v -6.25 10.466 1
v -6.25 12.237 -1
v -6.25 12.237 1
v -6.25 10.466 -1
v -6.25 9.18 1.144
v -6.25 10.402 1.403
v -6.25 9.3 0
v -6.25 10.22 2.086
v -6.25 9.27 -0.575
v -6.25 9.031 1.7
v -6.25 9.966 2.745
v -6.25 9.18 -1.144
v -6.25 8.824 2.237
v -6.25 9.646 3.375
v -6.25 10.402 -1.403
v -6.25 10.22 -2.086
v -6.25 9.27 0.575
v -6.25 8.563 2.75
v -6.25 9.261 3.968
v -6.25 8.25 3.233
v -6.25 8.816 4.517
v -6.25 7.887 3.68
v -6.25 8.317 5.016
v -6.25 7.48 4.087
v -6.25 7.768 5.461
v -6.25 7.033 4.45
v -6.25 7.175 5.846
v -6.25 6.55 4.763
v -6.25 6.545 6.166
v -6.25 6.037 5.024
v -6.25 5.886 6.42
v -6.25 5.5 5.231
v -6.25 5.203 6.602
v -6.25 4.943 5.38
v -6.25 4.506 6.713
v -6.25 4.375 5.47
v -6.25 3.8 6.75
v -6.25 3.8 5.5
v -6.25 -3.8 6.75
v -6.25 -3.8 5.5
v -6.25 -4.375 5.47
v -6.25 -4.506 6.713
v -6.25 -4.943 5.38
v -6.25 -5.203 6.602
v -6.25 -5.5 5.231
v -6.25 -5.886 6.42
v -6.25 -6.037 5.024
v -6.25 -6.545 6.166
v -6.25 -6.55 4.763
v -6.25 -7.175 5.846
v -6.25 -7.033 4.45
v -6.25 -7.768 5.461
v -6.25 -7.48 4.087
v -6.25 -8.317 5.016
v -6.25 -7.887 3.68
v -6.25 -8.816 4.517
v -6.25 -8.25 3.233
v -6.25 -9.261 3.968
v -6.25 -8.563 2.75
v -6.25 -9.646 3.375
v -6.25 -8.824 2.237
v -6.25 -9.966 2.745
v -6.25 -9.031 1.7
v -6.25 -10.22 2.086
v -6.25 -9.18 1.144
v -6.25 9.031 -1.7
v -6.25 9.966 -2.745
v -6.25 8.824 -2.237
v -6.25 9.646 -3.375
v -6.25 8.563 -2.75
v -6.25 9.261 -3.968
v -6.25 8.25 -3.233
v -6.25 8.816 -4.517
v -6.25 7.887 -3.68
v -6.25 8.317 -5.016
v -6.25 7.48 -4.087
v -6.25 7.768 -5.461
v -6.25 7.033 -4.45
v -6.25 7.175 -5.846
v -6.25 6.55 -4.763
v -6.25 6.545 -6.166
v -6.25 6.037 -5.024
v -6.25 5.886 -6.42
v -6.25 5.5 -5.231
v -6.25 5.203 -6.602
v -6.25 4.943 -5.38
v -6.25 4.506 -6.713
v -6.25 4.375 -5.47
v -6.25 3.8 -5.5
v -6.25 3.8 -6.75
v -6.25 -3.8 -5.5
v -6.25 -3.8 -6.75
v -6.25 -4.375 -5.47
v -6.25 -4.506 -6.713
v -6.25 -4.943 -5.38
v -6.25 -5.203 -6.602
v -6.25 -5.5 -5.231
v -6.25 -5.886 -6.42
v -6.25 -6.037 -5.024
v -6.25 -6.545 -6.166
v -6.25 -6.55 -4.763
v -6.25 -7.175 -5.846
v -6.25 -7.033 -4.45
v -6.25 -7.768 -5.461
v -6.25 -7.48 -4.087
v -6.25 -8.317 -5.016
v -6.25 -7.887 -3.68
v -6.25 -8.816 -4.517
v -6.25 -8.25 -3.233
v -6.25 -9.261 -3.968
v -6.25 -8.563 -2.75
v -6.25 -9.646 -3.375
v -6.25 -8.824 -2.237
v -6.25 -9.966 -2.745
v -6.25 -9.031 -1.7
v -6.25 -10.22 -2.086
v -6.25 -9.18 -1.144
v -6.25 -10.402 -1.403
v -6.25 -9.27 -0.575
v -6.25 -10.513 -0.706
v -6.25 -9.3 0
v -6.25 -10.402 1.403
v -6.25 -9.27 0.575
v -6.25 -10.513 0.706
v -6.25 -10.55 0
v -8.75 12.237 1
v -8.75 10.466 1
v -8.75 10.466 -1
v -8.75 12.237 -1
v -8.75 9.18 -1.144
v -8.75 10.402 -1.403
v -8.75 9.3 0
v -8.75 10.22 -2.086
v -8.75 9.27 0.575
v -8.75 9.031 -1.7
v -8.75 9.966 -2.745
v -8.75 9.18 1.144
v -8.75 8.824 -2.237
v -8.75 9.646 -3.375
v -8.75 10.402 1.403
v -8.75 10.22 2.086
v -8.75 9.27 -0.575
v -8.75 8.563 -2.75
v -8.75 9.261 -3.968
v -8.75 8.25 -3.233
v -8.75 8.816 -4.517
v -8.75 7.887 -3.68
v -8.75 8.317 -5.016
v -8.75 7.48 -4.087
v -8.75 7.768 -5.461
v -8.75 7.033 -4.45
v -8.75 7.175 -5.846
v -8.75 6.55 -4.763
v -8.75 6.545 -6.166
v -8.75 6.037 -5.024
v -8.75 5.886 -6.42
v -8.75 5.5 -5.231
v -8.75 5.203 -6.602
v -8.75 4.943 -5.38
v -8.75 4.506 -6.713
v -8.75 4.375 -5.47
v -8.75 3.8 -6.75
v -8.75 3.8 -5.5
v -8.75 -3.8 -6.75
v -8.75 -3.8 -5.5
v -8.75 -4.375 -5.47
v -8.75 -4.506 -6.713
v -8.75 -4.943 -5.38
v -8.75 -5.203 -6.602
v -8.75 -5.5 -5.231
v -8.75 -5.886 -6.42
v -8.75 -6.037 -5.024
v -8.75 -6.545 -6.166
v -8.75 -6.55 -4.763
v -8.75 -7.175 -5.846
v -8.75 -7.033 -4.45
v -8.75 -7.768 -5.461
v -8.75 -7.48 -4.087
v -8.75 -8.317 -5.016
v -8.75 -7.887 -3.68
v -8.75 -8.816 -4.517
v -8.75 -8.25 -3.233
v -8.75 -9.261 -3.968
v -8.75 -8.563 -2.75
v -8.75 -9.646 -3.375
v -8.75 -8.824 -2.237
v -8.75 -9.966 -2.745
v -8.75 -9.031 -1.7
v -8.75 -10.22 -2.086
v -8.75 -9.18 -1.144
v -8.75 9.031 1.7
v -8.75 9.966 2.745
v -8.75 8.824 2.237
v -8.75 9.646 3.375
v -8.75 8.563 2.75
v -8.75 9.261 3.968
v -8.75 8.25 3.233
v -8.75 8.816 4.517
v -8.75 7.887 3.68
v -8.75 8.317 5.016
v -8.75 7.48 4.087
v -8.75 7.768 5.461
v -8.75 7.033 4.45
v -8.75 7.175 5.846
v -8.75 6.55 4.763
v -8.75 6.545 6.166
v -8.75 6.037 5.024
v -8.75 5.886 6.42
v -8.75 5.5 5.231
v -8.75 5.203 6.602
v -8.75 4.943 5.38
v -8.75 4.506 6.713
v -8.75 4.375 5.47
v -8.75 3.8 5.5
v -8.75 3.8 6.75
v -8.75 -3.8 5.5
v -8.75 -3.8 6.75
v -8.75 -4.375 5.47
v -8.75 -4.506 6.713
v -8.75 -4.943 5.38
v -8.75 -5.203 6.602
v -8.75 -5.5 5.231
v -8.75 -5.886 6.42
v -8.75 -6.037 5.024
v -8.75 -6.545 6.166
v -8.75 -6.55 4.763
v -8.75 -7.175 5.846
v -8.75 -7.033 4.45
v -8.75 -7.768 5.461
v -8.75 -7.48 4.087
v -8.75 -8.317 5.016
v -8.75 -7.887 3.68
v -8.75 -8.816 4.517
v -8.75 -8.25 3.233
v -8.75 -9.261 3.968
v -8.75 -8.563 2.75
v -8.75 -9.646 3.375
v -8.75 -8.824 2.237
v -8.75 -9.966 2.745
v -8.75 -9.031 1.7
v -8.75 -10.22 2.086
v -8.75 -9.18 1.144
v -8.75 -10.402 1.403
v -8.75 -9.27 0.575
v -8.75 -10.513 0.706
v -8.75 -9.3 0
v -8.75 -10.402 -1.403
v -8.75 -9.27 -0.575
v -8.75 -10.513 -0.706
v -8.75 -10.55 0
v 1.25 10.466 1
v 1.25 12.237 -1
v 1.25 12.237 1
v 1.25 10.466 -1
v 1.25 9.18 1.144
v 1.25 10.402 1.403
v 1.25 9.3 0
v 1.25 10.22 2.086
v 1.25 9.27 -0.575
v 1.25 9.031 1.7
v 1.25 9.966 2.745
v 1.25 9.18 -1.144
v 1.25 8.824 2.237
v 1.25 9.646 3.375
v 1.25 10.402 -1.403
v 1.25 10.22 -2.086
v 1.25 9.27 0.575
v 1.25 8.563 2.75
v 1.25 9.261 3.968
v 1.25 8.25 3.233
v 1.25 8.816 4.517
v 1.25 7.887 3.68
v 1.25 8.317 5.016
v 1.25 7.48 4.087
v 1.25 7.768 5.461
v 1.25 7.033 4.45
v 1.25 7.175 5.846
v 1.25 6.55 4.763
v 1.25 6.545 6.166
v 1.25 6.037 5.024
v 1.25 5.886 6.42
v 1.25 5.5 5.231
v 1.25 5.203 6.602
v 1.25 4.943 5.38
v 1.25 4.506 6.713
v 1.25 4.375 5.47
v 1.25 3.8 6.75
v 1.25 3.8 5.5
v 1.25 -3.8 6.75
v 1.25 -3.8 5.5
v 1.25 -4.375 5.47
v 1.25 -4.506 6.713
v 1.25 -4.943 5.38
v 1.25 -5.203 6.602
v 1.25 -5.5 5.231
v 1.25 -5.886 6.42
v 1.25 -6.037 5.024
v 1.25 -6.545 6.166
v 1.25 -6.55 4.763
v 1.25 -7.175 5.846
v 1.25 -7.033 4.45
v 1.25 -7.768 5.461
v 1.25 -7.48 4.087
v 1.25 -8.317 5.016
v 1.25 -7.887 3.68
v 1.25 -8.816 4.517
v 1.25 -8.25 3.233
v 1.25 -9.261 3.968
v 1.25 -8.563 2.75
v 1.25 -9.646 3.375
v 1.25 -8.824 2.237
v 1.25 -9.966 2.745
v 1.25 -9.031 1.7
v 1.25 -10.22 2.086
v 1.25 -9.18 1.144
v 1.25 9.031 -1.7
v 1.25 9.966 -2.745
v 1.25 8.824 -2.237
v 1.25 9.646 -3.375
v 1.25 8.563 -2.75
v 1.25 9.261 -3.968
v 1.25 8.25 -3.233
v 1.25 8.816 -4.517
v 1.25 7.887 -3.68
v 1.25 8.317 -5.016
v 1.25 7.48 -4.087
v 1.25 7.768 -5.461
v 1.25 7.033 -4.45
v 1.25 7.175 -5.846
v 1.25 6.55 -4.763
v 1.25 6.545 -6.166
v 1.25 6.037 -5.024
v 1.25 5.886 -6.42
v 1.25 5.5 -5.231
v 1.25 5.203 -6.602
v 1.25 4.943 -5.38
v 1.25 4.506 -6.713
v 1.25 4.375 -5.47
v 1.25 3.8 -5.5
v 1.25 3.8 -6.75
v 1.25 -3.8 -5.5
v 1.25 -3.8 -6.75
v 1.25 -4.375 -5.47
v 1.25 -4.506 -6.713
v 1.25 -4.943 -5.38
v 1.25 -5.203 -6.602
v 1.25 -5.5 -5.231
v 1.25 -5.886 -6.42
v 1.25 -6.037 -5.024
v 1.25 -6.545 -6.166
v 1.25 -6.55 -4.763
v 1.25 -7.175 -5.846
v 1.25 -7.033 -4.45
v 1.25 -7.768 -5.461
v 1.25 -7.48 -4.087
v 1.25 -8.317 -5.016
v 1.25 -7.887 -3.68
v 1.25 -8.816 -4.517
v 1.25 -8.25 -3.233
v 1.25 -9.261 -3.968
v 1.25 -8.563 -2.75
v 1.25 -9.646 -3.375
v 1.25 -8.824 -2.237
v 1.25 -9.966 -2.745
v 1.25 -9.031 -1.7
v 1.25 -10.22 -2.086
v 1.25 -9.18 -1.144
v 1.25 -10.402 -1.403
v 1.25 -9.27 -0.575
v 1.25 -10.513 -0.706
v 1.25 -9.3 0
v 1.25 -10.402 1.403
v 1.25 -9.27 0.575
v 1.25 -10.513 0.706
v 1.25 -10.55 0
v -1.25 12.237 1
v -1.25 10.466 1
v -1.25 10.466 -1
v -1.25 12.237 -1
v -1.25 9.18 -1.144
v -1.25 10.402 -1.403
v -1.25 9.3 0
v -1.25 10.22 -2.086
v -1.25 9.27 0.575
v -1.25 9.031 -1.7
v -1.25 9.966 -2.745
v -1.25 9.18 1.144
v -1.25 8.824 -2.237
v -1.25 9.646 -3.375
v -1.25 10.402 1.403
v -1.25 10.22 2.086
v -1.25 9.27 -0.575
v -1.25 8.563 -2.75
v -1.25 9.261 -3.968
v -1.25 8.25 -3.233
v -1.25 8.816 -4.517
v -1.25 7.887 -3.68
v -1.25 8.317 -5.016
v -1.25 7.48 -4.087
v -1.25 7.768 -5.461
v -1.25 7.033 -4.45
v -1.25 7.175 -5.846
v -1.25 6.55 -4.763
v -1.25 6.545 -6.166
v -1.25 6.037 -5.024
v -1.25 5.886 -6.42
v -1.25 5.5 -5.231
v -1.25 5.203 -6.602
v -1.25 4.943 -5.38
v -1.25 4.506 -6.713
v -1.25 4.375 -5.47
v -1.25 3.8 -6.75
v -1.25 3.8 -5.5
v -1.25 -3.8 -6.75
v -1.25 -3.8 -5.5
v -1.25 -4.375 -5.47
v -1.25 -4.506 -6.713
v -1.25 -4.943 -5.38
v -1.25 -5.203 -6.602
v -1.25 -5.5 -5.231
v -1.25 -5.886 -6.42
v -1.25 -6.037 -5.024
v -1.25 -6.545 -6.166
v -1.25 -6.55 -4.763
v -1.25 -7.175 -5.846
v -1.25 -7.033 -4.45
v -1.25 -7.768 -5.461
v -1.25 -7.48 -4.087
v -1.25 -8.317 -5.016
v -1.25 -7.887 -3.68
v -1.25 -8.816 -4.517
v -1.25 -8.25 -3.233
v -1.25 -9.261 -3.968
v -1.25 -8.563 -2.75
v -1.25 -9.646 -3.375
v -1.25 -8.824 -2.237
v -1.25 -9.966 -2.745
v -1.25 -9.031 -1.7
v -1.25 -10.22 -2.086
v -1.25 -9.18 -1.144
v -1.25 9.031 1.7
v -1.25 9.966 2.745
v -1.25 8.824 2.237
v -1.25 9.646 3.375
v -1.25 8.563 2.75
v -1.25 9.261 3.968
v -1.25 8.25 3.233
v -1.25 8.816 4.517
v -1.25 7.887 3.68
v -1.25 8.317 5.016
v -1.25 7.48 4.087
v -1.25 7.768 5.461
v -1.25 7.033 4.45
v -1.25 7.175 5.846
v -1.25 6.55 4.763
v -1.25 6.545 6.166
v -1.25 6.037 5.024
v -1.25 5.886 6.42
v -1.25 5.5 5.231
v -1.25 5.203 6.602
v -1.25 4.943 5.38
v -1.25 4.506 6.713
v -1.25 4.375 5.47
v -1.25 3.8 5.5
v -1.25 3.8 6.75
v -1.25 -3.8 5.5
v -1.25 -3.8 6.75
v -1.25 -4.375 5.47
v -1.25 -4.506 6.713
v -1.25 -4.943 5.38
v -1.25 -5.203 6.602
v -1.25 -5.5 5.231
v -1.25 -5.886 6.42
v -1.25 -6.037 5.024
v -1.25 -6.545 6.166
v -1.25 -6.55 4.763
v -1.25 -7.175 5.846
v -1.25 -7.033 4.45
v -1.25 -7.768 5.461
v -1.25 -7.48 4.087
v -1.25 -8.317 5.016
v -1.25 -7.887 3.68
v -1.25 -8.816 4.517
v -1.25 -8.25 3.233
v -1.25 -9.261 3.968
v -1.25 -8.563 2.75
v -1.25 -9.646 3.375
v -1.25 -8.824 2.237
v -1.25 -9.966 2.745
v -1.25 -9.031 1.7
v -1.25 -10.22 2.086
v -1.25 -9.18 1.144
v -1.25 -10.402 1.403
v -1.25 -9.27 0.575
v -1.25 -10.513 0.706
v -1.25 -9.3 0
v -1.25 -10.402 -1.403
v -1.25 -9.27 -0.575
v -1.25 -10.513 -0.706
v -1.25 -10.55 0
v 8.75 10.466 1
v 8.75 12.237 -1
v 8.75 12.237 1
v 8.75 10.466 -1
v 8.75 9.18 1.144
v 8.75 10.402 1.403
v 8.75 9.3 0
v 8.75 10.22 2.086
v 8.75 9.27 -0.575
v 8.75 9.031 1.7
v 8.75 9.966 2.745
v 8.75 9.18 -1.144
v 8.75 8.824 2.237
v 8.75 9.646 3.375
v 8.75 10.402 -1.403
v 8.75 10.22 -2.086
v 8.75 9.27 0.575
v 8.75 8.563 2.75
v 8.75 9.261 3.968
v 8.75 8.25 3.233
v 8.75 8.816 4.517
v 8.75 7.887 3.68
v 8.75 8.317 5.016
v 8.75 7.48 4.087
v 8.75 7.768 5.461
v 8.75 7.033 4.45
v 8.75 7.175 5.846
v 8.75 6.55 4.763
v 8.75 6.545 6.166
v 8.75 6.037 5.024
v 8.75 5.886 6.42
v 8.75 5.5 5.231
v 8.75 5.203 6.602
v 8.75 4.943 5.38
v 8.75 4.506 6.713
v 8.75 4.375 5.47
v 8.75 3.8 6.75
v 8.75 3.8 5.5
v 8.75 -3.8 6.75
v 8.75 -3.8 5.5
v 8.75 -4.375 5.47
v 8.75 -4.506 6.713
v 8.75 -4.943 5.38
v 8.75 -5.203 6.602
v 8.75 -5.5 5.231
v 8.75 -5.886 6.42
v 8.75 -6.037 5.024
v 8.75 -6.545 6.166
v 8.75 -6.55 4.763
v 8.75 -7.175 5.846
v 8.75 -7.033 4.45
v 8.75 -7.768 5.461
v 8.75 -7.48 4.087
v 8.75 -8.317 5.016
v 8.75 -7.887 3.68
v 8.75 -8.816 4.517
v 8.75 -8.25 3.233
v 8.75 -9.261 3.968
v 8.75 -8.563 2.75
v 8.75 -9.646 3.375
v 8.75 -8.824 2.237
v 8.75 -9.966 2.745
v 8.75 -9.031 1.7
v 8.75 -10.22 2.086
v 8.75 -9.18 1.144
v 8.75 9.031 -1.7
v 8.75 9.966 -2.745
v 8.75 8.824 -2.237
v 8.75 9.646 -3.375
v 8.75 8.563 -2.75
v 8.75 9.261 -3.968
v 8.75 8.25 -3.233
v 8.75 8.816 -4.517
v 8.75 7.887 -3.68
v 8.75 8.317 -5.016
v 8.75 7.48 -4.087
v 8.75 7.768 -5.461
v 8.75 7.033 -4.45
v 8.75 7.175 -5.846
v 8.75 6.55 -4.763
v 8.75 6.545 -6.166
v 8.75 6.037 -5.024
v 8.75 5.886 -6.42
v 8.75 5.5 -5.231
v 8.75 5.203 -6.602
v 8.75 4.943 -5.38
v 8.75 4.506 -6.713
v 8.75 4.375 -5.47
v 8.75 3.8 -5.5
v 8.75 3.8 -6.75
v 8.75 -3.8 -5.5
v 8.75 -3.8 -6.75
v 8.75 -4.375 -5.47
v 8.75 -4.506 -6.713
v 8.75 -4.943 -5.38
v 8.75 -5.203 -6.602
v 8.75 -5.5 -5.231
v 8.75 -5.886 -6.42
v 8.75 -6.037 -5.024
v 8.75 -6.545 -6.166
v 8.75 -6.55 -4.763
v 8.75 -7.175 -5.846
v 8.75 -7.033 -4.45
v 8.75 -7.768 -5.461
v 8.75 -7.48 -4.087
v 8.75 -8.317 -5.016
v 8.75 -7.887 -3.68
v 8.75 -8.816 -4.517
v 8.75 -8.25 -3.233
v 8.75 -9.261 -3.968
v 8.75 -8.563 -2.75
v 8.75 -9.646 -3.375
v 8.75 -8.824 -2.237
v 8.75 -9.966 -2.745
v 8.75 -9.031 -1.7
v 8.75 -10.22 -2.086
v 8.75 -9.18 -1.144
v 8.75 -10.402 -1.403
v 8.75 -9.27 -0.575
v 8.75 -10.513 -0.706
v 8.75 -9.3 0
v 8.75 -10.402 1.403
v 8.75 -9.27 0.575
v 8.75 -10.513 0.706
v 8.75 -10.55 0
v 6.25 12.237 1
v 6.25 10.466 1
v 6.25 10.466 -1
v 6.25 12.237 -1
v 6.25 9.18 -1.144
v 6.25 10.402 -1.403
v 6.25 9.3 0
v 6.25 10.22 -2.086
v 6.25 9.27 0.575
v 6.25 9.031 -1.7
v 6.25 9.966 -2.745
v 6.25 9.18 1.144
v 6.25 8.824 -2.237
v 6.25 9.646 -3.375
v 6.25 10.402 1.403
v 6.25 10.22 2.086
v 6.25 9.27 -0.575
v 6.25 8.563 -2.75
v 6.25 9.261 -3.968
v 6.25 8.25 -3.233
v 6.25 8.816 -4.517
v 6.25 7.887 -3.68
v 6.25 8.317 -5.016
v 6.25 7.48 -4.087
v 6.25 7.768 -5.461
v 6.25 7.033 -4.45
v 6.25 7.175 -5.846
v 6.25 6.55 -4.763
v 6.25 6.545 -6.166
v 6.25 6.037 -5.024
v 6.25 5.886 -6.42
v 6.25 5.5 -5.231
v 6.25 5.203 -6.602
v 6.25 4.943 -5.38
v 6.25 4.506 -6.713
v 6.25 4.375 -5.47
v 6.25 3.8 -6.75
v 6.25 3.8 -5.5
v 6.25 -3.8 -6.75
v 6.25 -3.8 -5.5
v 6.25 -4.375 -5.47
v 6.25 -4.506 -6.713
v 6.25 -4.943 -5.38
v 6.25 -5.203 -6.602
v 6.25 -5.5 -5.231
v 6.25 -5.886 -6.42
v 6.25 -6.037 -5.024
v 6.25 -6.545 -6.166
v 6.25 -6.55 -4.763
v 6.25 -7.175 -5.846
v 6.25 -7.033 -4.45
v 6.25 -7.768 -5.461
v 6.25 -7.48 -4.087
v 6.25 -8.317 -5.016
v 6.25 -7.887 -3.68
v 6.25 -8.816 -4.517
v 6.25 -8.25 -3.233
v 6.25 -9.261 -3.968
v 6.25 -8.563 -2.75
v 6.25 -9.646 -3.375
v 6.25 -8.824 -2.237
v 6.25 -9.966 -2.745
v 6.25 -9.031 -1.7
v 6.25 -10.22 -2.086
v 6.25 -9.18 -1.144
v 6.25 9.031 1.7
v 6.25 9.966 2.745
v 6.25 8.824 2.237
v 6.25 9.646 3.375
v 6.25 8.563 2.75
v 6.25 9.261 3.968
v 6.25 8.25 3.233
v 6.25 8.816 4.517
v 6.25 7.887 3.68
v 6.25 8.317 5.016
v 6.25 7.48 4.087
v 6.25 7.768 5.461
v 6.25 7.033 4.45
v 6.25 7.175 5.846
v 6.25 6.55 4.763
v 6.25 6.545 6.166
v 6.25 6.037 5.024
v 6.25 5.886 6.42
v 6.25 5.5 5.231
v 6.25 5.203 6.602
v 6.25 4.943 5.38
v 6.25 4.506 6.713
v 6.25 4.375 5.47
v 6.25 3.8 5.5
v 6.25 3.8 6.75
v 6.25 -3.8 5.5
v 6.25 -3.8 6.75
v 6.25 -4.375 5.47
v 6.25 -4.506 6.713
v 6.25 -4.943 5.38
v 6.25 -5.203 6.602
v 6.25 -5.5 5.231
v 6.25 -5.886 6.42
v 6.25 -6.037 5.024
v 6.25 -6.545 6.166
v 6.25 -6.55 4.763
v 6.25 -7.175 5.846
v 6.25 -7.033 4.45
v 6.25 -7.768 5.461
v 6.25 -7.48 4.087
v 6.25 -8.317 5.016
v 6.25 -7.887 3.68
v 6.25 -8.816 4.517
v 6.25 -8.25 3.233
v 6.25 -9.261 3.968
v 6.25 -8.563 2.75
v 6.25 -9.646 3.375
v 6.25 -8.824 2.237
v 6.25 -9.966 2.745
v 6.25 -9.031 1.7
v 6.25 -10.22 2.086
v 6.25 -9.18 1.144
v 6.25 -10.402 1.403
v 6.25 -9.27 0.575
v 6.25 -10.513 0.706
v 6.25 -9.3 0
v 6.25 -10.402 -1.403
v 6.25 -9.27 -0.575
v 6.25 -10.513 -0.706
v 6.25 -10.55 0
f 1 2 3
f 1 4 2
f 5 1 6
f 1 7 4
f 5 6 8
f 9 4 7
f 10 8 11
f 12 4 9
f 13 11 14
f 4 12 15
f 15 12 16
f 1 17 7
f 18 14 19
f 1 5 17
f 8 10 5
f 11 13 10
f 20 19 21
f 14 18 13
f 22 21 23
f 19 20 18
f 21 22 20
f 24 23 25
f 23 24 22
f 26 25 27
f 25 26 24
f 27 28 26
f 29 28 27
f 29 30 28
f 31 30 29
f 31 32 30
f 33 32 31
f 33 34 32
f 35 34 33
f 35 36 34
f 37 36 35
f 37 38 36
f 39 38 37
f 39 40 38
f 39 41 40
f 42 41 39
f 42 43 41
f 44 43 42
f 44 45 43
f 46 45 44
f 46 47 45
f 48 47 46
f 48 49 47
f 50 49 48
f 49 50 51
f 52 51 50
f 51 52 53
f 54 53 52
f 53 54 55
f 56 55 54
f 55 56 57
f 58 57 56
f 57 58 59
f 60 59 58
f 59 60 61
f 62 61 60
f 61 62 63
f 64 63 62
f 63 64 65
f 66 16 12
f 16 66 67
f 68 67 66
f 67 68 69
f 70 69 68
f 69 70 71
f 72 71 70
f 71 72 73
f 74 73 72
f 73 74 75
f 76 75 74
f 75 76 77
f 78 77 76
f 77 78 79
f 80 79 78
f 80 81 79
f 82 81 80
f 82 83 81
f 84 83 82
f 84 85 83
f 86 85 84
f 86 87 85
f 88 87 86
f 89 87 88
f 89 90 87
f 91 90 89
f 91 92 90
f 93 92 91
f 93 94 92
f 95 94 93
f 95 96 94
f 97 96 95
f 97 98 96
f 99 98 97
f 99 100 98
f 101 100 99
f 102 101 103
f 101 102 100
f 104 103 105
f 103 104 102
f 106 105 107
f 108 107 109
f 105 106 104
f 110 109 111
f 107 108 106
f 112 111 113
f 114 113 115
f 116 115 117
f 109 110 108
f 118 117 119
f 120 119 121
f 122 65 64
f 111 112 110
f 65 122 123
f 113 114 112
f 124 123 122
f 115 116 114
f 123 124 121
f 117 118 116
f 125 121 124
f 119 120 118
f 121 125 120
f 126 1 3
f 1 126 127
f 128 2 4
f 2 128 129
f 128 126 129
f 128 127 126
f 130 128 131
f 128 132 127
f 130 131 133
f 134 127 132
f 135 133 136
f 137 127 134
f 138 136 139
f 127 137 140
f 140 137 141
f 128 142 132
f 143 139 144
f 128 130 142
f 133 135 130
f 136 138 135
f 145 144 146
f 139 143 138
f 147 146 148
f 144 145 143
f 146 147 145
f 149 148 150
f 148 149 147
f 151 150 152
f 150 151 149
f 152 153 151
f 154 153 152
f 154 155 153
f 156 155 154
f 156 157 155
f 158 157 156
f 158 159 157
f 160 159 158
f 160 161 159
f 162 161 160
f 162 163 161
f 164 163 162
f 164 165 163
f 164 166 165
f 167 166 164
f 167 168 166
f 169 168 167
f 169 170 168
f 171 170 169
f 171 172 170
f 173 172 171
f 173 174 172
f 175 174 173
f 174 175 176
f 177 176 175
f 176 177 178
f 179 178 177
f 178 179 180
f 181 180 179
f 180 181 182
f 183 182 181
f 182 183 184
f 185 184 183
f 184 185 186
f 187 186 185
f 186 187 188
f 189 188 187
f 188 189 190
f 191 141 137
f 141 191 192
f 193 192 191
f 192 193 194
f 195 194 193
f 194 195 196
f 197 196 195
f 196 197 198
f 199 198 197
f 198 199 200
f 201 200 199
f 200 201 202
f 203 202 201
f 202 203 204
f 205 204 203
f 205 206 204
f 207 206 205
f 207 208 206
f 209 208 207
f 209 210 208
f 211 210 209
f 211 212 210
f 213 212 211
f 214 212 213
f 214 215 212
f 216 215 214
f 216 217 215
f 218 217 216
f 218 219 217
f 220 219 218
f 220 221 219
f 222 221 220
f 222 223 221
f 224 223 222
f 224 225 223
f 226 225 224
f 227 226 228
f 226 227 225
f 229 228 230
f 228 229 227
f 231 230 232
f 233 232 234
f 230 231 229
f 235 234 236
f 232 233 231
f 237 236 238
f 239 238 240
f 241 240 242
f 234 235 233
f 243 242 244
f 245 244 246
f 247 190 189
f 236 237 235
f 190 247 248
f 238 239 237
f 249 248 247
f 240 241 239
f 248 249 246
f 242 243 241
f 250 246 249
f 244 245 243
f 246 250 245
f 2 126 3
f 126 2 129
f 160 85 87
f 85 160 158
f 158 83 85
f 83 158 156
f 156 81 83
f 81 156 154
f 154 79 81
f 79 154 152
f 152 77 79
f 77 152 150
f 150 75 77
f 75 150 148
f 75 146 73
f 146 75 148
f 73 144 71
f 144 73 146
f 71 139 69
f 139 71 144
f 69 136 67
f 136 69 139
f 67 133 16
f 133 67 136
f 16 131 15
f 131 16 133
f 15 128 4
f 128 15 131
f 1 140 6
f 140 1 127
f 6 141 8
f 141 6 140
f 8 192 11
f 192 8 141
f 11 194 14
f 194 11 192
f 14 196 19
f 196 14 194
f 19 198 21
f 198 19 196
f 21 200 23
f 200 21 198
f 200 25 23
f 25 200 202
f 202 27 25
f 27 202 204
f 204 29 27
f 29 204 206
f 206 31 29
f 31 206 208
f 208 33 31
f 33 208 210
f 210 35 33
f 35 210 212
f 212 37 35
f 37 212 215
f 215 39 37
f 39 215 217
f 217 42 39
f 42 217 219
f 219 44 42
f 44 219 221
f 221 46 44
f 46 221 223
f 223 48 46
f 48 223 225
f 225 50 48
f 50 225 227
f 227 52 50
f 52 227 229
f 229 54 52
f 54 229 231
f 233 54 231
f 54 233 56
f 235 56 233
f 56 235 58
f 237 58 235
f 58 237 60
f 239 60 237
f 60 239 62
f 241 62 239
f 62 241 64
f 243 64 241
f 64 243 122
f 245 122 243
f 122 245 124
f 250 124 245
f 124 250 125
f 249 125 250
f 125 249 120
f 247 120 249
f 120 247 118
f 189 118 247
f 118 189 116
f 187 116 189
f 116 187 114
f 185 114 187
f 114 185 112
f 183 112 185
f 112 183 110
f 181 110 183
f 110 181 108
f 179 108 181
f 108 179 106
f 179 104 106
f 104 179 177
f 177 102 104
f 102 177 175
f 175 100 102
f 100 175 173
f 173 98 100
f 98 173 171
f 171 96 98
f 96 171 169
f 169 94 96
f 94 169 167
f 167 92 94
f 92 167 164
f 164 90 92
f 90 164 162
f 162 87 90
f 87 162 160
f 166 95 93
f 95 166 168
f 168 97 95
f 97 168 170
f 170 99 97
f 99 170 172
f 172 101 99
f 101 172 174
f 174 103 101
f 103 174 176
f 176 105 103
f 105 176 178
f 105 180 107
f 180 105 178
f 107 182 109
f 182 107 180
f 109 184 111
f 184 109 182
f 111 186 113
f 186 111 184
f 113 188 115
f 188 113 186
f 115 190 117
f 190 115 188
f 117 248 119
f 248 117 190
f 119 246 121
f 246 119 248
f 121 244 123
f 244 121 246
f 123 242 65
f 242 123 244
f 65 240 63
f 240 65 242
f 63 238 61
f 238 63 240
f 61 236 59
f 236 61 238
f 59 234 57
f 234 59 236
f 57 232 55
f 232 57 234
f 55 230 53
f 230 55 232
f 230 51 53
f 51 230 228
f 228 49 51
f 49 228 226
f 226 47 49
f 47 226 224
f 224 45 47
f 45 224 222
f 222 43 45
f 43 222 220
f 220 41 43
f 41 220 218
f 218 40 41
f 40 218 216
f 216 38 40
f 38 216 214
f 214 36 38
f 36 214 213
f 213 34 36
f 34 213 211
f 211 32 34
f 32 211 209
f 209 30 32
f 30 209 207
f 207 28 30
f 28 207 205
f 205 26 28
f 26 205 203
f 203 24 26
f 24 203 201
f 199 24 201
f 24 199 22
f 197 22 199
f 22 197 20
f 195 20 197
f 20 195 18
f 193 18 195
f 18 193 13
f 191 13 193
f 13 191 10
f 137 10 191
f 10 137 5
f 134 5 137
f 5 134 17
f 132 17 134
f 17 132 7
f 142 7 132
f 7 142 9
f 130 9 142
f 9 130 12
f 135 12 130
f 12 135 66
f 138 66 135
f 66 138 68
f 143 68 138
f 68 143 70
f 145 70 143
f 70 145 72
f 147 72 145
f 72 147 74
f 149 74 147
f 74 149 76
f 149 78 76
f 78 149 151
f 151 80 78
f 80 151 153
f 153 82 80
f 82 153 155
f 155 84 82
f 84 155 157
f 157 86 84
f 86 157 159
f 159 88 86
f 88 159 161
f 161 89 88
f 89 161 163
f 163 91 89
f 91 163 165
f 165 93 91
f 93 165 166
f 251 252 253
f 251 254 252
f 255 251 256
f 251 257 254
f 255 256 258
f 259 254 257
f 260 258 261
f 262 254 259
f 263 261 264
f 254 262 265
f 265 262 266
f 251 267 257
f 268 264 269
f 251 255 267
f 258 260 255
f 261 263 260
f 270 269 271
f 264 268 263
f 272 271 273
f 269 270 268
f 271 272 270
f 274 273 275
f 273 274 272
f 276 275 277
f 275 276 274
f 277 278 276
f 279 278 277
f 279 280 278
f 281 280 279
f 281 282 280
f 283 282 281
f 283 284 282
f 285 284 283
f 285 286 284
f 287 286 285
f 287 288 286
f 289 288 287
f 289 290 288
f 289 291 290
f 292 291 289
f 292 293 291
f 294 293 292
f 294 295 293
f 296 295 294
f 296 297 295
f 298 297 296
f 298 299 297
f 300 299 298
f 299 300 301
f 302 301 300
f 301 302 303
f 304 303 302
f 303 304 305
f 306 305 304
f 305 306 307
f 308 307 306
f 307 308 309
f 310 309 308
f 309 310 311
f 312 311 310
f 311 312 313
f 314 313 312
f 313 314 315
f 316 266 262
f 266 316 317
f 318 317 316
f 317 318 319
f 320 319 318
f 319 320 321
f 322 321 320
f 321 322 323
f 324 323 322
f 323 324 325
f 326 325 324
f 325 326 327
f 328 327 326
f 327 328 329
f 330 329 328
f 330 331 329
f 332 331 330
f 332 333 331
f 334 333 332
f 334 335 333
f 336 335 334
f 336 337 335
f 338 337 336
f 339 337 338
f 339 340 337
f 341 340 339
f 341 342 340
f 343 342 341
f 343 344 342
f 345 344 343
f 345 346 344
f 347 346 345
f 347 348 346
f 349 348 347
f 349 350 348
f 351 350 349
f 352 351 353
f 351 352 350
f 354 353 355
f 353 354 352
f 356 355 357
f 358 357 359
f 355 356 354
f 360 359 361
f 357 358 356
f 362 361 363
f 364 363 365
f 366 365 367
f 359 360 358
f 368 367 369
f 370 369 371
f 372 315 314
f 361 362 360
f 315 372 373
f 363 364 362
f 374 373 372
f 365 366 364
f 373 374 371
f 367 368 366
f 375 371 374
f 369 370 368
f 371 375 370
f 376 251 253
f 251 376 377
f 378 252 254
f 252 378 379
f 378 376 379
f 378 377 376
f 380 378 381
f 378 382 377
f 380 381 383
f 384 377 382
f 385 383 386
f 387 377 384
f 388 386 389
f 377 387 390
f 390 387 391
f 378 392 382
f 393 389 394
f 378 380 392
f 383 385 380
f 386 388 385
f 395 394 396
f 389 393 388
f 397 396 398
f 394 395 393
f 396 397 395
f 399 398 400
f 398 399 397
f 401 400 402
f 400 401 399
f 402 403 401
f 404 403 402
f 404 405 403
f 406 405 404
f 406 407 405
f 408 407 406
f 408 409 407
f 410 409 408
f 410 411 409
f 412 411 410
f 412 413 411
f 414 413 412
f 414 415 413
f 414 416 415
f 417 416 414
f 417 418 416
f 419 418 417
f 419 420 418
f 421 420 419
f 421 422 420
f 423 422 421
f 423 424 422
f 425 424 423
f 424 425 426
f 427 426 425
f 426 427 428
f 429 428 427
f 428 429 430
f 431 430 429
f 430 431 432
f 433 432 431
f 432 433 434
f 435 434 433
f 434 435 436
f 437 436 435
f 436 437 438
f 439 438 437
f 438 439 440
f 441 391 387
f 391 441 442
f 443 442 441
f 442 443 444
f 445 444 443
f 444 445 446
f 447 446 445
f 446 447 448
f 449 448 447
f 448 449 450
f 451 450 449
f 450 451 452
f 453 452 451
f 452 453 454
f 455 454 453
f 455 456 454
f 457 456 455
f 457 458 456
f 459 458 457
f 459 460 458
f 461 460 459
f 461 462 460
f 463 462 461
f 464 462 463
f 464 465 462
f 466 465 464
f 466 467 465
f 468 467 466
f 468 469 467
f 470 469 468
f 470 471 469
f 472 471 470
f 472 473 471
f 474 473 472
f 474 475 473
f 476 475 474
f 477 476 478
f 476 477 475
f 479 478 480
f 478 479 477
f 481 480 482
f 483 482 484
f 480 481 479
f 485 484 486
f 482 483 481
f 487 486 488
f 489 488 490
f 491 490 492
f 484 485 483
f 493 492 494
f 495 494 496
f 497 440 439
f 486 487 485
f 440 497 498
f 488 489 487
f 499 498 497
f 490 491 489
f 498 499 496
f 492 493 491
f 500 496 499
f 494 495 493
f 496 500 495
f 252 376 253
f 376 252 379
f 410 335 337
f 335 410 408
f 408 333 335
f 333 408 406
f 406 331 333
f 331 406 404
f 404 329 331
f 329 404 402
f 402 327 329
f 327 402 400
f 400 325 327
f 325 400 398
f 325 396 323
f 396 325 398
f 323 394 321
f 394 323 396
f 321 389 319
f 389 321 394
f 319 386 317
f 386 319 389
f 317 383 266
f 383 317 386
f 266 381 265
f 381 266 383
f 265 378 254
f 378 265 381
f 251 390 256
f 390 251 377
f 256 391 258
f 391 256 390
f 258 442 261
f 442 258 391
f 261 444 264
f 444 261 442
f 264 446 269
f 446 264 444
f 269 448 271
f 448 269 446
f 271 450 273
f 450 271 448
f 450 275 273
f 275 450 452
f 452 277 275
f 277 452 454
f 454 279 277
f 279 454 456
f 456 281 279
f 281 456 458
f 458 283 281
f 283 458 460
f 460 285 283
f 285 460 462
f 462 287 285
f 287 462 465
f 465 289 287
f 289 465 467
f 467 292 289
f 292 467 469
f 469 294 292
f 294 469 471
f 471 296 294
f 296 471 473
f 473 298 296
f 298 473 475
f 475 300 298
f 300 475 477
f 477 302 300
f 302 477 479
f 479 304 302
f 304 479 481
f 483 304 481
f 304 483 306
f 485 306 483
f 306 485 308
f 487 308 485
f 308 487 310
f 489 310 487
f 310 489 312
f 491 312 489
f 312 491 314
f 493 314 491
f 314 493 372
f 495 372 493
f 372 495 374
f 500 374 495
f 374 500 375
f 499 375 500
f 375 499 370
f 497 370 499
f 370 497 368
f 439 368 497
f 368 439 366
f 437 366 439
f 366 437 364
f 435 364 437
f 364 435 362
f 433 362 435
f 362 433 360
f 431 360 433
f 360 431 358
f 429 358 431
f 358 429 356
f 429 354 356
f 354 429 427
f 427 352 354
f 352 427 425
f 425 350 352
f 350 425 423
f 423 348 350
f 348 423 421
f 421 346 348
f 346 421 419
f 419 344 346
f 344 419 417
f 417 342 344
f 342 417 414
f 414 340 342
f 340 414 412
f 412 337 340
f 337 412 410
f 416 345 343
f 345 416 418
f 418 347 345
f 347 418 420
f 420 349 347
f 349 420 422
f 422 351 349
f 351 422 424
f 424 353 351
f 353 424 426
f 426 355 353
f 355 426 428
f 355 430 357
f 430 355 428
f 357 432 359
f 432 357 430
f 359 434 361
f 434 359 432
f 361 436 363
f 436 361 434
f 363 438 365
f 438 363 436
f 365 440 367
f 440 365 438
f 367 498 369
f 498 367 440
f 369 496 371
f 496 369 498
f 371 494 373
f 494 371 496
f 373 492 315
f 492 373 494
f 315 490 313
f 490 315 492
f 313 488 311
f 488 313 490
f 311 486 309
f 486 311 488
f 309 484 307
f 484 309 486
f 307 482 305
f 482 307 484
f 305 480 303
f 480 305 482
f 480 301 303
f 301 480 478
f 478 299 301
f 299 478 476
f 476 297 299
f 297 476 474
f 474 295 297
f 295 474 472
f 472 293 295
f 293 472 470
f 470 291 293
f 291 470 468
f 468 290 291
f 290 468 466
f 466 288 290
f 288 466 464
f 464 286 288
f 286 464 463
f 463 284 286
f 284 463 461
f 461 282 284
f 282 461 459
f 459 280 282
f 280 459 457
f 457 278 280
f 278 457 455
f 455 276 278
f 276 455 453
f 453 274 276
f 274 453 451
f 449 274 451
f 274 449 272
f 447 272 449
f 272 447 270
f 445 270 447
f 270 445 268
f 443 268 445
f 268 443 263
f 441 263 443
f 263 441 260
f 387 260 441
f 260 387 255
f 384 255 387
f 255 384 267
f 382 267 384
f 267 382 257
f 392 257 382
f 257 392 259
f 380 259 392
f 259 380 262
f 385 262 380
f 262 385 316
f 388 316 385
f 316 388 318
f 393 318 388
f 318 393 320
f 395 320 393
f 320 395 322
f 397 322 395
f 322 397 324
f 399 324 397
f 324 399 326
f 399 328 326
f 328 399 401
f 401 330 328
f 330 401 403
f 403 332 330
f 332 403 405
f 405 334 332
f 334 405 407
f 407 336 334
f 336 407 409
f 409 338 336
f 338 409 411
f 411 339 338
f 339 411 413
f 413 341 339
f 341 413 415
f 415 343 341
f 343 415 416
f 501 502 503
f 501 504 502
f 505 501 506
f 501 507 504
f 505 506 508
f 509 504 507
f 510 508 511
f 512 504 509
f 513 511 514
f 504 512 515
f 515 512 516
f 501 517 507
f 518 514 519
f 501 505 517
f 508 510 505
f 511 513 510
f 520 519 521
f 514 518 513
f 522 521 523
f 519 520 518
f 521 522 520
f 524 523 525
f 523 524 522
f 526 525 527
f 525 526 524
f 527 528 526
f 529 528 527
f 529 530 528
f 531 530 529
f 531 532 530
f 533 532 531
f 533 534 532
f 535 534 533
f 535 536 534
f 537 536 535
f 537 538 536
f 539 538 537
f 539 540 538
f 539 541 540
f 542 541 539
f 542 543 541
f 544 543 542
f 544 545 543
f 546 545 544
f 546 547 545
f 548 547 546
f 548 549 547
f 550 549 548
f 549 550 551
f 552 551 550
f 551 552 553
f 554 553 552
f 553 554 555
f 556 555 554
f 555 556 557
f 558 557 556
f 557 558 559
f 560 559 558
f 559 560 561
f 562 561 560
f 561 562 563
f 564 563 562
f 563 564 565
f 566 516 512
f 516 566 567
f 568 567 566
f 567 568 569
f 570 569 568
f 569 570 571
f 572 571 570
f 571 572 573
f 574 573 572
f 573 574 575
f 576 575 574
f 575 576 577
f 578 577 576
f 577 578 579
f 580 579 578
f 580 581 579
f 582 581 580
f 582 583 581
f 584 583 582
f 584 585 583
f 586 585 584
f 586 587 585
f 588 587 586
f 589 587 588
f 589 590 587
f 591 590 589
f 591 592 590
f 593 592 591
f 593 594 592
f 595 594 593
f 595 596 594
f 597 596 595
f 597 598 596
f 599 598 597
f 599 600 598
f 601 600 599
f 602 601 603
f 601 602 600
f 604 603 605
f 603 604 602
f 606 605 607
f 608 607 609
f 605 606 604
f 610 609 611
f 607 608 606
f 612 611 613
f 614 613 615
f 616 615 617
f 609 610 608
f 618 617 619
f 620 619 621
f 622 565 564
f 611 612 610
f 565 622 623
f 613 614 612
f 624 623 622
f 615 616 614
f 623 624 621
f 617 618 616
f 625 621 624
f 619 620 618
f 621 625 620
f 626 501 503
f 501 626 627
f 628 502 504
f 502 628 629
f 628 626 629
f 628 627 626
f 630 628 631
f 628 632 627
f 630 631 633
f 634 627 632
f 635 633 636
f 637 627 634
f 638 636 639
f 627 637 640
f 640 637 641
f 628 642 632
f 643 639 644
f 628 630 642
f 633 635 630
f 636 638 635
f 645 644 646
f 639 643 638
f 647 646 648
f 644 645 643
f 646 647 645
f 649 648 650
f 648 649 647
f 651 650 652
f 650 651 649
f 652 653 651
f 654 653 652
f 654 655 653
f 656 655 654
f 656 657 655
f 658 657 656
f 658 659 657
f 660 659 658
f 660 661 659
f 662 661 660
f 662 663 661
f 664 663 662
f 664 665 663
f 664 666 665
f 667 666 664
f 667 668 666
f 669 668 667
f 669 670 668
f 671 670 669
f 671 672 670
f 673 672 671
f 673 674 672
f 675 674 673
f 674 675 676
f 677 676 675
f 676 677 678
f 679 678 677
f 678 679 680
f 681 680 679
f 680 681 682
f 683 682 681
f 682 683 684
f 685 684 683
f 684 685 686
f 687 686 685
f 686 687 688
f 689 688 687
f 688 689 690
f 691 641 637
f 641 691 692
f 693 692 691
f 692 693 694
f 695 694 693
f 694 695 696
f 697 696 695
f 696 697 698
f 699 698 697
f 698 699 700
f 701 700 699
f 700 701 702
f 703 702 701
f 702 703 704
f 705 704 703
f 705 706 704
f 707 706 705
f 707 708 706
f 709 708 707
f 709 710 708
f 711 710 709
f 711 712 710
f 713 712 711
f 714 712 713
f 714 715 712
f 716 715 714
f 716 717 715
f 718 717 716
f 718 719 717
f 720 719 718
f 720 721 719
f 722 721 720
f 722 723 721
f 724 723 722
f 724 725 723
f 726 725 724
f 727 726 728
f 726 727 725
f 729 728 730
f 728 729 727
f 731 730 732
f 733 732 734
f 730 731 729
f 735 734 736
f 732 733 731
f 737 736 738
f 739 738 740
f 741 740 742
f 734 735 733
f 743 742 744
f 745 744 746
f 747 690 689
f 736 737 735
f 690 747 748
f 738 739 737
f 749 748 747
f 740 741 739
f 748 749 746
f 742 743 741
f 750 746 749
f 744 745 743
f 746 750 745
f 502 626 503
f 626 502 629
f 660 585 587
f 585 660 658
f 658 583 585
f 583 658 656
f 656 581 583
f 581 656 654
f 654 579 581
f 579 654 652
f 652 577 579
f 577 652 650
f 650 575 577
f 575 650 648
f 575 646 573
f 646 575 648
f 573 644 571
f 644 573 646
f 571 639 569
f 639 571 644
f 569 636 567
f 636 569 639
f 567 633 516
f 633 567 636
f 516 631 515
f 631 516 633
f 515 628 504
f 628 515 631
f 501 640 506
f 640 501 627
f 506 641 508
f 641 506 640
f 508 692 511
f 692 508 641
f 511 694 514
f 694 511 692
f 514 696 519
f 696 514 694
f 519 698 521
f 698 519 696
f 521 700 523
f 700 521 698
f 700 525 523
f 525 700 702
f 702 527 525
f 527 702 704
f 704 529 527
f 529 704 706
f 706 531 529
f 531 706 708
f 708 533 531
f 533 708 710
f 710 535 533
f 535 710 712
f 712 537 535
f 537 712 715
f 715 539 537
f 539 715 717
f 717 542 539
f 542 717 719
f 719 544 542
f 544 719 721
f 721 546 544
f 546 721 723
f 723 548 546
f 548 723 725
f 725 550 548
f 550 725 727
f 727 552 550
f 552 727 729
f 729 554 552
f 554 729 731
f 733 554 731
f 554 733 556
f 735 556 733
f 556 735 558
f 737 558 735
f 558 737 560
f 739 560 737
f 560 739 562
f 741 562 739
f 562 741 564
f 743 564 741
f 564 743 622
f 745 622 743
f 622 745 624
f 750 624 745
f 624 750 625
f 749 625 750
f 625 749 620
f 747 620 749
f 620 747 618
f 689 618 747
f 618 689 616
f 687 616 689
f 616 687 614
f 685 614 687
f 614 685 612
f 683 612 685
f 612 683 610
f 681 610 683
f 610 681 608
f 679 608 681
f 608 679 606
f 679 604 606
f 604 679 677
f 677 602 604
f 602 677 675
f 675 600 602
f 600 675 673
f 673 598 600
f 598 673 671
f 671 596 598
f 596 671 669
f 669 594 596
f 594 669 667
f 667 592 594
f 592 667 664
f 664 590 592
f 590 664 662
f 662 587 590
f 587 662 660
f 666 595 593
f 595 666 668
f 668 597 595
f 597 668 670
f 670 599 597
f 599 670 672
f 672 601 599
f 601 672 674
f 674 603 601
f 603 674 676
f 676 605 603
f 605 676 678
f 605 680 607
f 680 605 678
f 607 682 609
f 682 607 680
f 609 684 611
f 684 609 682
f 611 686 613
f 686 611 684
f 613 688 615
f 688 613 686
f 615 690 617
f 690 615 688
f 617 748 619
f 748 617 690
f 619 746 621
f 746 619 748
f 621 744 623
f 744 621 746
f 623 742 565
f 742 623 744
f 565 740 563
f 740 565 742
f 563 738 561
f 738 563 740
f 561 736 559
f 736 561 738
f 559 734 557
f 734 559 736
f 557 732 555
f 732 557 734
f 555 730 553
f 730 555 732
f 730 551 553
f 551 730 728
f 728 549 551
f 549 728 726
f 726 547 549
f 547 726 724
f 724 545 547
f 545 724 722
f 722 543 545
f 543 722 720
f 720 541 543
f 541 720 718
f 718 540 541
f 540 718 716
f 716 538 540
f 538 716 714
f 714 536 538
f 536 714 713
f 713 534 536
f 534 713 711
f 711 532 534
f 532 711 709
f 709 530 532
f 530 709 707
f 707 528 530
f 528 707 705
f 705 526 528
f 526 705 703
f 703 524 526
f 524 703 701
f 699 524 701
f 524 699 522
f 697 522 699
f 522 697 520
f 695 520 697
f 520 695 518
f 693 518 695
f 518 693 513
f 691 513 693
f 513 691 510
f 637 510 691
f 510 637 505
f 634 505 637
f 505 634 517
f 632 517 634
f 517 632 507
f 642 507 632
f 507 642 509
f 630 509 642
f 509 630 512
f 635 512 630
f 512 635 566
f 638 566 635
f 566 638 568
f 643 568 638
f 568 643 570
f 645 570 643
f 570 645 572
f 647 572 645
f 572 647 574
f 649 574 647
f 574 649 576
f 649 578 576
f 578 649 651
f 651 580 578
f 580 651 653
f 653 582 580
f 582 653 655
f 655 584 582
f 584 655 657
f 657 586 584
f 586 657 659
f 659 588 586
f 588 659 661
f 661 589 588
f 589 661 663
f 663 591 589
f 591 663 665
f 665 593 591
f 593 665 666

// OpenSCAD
function mm(x) = x;

module tiewrapFlatHalfLoop(loopInnerDiameter, tiewrapThickness) {
	loopOuterDiameter = loopInnerDiameter + tiewrapThickness * 2;
	loopOuterRadius = loopOuterDiameter / 2;
	difference() {
		circle(d=loopOuterDiameter, $fn=60);

		circle(d=loopInnerDiameter, $fn=60);

		translate([0, loopOuterRadius, 0])
			square([loopOuterDiameter, loopOuterDiameter], center=true);
	}
}

module tiewrapFlat(loopInnerDiameter, loopStretch, tiewrapThickness) {
	loopOuterDiameter = loopInnerDiameter + tiewrapThickness * 2;
	loopOuterRadius = loopOuterDiameter / 2;
	loopInnerRadius = loopInnerDiameter / 2;
	union() {
		translate([0, -loopStretch / 2, 0])
		tiewrapFlatHalfLoop(loopInnerDiameter, tiewrapThickness);

		translate([0, loopStretch / 2, 0])
			rotate([0, 0, 180])
			tiewrapFlatHalfLoop(loopInnerDiameter, tiewrapThickness);

		translate([loopInnerRadius + tiewrapThickness / 2, 0, 0])
			square([tiewrapThickness, loopStretch], center=true);

		translate([-loopInnerRadius - tiewrapThickness / 2, 0, 0])
			square([tiewrapThickness, loopStretch], center=true);
	}
}

module tiewrapLoop(loopInnerDiameter, loopStretch, tiewrapWidth, tiewrapThickness) {
	lockDepth = mm(2);
	lockHeight = mm(2);
	color("#ffff00")
		union() {
			translate([0, loopInnerDiameter / 2 + tiewrapThickness + loopStretch / 2	 + (lockDepth - tiewrapThickness) / 2, 0])
				cube([tiewrapWidth, lockDepth + tiewrapThickness / 2, lockHeight], center=true);

			rotate([0, 90, 0])
				linear_extrude(tiewrapWidth, center=true)
				tiewrapFlat(loopInnerDiameter, loopStretch, tiewrapThickness);
		}
}

for (x = [ -mm(7.5) : mm(7.5) : mm(7.5) ]) {
	translate([x, 0, 0])
		tiewrapLoop(loopInnerDiameter=mm(11), loopStretch=mm(1.6 + 12 / 2), tiewrapWidth=mm(2.5), tiewrapThickness=mm(1.25));
}
